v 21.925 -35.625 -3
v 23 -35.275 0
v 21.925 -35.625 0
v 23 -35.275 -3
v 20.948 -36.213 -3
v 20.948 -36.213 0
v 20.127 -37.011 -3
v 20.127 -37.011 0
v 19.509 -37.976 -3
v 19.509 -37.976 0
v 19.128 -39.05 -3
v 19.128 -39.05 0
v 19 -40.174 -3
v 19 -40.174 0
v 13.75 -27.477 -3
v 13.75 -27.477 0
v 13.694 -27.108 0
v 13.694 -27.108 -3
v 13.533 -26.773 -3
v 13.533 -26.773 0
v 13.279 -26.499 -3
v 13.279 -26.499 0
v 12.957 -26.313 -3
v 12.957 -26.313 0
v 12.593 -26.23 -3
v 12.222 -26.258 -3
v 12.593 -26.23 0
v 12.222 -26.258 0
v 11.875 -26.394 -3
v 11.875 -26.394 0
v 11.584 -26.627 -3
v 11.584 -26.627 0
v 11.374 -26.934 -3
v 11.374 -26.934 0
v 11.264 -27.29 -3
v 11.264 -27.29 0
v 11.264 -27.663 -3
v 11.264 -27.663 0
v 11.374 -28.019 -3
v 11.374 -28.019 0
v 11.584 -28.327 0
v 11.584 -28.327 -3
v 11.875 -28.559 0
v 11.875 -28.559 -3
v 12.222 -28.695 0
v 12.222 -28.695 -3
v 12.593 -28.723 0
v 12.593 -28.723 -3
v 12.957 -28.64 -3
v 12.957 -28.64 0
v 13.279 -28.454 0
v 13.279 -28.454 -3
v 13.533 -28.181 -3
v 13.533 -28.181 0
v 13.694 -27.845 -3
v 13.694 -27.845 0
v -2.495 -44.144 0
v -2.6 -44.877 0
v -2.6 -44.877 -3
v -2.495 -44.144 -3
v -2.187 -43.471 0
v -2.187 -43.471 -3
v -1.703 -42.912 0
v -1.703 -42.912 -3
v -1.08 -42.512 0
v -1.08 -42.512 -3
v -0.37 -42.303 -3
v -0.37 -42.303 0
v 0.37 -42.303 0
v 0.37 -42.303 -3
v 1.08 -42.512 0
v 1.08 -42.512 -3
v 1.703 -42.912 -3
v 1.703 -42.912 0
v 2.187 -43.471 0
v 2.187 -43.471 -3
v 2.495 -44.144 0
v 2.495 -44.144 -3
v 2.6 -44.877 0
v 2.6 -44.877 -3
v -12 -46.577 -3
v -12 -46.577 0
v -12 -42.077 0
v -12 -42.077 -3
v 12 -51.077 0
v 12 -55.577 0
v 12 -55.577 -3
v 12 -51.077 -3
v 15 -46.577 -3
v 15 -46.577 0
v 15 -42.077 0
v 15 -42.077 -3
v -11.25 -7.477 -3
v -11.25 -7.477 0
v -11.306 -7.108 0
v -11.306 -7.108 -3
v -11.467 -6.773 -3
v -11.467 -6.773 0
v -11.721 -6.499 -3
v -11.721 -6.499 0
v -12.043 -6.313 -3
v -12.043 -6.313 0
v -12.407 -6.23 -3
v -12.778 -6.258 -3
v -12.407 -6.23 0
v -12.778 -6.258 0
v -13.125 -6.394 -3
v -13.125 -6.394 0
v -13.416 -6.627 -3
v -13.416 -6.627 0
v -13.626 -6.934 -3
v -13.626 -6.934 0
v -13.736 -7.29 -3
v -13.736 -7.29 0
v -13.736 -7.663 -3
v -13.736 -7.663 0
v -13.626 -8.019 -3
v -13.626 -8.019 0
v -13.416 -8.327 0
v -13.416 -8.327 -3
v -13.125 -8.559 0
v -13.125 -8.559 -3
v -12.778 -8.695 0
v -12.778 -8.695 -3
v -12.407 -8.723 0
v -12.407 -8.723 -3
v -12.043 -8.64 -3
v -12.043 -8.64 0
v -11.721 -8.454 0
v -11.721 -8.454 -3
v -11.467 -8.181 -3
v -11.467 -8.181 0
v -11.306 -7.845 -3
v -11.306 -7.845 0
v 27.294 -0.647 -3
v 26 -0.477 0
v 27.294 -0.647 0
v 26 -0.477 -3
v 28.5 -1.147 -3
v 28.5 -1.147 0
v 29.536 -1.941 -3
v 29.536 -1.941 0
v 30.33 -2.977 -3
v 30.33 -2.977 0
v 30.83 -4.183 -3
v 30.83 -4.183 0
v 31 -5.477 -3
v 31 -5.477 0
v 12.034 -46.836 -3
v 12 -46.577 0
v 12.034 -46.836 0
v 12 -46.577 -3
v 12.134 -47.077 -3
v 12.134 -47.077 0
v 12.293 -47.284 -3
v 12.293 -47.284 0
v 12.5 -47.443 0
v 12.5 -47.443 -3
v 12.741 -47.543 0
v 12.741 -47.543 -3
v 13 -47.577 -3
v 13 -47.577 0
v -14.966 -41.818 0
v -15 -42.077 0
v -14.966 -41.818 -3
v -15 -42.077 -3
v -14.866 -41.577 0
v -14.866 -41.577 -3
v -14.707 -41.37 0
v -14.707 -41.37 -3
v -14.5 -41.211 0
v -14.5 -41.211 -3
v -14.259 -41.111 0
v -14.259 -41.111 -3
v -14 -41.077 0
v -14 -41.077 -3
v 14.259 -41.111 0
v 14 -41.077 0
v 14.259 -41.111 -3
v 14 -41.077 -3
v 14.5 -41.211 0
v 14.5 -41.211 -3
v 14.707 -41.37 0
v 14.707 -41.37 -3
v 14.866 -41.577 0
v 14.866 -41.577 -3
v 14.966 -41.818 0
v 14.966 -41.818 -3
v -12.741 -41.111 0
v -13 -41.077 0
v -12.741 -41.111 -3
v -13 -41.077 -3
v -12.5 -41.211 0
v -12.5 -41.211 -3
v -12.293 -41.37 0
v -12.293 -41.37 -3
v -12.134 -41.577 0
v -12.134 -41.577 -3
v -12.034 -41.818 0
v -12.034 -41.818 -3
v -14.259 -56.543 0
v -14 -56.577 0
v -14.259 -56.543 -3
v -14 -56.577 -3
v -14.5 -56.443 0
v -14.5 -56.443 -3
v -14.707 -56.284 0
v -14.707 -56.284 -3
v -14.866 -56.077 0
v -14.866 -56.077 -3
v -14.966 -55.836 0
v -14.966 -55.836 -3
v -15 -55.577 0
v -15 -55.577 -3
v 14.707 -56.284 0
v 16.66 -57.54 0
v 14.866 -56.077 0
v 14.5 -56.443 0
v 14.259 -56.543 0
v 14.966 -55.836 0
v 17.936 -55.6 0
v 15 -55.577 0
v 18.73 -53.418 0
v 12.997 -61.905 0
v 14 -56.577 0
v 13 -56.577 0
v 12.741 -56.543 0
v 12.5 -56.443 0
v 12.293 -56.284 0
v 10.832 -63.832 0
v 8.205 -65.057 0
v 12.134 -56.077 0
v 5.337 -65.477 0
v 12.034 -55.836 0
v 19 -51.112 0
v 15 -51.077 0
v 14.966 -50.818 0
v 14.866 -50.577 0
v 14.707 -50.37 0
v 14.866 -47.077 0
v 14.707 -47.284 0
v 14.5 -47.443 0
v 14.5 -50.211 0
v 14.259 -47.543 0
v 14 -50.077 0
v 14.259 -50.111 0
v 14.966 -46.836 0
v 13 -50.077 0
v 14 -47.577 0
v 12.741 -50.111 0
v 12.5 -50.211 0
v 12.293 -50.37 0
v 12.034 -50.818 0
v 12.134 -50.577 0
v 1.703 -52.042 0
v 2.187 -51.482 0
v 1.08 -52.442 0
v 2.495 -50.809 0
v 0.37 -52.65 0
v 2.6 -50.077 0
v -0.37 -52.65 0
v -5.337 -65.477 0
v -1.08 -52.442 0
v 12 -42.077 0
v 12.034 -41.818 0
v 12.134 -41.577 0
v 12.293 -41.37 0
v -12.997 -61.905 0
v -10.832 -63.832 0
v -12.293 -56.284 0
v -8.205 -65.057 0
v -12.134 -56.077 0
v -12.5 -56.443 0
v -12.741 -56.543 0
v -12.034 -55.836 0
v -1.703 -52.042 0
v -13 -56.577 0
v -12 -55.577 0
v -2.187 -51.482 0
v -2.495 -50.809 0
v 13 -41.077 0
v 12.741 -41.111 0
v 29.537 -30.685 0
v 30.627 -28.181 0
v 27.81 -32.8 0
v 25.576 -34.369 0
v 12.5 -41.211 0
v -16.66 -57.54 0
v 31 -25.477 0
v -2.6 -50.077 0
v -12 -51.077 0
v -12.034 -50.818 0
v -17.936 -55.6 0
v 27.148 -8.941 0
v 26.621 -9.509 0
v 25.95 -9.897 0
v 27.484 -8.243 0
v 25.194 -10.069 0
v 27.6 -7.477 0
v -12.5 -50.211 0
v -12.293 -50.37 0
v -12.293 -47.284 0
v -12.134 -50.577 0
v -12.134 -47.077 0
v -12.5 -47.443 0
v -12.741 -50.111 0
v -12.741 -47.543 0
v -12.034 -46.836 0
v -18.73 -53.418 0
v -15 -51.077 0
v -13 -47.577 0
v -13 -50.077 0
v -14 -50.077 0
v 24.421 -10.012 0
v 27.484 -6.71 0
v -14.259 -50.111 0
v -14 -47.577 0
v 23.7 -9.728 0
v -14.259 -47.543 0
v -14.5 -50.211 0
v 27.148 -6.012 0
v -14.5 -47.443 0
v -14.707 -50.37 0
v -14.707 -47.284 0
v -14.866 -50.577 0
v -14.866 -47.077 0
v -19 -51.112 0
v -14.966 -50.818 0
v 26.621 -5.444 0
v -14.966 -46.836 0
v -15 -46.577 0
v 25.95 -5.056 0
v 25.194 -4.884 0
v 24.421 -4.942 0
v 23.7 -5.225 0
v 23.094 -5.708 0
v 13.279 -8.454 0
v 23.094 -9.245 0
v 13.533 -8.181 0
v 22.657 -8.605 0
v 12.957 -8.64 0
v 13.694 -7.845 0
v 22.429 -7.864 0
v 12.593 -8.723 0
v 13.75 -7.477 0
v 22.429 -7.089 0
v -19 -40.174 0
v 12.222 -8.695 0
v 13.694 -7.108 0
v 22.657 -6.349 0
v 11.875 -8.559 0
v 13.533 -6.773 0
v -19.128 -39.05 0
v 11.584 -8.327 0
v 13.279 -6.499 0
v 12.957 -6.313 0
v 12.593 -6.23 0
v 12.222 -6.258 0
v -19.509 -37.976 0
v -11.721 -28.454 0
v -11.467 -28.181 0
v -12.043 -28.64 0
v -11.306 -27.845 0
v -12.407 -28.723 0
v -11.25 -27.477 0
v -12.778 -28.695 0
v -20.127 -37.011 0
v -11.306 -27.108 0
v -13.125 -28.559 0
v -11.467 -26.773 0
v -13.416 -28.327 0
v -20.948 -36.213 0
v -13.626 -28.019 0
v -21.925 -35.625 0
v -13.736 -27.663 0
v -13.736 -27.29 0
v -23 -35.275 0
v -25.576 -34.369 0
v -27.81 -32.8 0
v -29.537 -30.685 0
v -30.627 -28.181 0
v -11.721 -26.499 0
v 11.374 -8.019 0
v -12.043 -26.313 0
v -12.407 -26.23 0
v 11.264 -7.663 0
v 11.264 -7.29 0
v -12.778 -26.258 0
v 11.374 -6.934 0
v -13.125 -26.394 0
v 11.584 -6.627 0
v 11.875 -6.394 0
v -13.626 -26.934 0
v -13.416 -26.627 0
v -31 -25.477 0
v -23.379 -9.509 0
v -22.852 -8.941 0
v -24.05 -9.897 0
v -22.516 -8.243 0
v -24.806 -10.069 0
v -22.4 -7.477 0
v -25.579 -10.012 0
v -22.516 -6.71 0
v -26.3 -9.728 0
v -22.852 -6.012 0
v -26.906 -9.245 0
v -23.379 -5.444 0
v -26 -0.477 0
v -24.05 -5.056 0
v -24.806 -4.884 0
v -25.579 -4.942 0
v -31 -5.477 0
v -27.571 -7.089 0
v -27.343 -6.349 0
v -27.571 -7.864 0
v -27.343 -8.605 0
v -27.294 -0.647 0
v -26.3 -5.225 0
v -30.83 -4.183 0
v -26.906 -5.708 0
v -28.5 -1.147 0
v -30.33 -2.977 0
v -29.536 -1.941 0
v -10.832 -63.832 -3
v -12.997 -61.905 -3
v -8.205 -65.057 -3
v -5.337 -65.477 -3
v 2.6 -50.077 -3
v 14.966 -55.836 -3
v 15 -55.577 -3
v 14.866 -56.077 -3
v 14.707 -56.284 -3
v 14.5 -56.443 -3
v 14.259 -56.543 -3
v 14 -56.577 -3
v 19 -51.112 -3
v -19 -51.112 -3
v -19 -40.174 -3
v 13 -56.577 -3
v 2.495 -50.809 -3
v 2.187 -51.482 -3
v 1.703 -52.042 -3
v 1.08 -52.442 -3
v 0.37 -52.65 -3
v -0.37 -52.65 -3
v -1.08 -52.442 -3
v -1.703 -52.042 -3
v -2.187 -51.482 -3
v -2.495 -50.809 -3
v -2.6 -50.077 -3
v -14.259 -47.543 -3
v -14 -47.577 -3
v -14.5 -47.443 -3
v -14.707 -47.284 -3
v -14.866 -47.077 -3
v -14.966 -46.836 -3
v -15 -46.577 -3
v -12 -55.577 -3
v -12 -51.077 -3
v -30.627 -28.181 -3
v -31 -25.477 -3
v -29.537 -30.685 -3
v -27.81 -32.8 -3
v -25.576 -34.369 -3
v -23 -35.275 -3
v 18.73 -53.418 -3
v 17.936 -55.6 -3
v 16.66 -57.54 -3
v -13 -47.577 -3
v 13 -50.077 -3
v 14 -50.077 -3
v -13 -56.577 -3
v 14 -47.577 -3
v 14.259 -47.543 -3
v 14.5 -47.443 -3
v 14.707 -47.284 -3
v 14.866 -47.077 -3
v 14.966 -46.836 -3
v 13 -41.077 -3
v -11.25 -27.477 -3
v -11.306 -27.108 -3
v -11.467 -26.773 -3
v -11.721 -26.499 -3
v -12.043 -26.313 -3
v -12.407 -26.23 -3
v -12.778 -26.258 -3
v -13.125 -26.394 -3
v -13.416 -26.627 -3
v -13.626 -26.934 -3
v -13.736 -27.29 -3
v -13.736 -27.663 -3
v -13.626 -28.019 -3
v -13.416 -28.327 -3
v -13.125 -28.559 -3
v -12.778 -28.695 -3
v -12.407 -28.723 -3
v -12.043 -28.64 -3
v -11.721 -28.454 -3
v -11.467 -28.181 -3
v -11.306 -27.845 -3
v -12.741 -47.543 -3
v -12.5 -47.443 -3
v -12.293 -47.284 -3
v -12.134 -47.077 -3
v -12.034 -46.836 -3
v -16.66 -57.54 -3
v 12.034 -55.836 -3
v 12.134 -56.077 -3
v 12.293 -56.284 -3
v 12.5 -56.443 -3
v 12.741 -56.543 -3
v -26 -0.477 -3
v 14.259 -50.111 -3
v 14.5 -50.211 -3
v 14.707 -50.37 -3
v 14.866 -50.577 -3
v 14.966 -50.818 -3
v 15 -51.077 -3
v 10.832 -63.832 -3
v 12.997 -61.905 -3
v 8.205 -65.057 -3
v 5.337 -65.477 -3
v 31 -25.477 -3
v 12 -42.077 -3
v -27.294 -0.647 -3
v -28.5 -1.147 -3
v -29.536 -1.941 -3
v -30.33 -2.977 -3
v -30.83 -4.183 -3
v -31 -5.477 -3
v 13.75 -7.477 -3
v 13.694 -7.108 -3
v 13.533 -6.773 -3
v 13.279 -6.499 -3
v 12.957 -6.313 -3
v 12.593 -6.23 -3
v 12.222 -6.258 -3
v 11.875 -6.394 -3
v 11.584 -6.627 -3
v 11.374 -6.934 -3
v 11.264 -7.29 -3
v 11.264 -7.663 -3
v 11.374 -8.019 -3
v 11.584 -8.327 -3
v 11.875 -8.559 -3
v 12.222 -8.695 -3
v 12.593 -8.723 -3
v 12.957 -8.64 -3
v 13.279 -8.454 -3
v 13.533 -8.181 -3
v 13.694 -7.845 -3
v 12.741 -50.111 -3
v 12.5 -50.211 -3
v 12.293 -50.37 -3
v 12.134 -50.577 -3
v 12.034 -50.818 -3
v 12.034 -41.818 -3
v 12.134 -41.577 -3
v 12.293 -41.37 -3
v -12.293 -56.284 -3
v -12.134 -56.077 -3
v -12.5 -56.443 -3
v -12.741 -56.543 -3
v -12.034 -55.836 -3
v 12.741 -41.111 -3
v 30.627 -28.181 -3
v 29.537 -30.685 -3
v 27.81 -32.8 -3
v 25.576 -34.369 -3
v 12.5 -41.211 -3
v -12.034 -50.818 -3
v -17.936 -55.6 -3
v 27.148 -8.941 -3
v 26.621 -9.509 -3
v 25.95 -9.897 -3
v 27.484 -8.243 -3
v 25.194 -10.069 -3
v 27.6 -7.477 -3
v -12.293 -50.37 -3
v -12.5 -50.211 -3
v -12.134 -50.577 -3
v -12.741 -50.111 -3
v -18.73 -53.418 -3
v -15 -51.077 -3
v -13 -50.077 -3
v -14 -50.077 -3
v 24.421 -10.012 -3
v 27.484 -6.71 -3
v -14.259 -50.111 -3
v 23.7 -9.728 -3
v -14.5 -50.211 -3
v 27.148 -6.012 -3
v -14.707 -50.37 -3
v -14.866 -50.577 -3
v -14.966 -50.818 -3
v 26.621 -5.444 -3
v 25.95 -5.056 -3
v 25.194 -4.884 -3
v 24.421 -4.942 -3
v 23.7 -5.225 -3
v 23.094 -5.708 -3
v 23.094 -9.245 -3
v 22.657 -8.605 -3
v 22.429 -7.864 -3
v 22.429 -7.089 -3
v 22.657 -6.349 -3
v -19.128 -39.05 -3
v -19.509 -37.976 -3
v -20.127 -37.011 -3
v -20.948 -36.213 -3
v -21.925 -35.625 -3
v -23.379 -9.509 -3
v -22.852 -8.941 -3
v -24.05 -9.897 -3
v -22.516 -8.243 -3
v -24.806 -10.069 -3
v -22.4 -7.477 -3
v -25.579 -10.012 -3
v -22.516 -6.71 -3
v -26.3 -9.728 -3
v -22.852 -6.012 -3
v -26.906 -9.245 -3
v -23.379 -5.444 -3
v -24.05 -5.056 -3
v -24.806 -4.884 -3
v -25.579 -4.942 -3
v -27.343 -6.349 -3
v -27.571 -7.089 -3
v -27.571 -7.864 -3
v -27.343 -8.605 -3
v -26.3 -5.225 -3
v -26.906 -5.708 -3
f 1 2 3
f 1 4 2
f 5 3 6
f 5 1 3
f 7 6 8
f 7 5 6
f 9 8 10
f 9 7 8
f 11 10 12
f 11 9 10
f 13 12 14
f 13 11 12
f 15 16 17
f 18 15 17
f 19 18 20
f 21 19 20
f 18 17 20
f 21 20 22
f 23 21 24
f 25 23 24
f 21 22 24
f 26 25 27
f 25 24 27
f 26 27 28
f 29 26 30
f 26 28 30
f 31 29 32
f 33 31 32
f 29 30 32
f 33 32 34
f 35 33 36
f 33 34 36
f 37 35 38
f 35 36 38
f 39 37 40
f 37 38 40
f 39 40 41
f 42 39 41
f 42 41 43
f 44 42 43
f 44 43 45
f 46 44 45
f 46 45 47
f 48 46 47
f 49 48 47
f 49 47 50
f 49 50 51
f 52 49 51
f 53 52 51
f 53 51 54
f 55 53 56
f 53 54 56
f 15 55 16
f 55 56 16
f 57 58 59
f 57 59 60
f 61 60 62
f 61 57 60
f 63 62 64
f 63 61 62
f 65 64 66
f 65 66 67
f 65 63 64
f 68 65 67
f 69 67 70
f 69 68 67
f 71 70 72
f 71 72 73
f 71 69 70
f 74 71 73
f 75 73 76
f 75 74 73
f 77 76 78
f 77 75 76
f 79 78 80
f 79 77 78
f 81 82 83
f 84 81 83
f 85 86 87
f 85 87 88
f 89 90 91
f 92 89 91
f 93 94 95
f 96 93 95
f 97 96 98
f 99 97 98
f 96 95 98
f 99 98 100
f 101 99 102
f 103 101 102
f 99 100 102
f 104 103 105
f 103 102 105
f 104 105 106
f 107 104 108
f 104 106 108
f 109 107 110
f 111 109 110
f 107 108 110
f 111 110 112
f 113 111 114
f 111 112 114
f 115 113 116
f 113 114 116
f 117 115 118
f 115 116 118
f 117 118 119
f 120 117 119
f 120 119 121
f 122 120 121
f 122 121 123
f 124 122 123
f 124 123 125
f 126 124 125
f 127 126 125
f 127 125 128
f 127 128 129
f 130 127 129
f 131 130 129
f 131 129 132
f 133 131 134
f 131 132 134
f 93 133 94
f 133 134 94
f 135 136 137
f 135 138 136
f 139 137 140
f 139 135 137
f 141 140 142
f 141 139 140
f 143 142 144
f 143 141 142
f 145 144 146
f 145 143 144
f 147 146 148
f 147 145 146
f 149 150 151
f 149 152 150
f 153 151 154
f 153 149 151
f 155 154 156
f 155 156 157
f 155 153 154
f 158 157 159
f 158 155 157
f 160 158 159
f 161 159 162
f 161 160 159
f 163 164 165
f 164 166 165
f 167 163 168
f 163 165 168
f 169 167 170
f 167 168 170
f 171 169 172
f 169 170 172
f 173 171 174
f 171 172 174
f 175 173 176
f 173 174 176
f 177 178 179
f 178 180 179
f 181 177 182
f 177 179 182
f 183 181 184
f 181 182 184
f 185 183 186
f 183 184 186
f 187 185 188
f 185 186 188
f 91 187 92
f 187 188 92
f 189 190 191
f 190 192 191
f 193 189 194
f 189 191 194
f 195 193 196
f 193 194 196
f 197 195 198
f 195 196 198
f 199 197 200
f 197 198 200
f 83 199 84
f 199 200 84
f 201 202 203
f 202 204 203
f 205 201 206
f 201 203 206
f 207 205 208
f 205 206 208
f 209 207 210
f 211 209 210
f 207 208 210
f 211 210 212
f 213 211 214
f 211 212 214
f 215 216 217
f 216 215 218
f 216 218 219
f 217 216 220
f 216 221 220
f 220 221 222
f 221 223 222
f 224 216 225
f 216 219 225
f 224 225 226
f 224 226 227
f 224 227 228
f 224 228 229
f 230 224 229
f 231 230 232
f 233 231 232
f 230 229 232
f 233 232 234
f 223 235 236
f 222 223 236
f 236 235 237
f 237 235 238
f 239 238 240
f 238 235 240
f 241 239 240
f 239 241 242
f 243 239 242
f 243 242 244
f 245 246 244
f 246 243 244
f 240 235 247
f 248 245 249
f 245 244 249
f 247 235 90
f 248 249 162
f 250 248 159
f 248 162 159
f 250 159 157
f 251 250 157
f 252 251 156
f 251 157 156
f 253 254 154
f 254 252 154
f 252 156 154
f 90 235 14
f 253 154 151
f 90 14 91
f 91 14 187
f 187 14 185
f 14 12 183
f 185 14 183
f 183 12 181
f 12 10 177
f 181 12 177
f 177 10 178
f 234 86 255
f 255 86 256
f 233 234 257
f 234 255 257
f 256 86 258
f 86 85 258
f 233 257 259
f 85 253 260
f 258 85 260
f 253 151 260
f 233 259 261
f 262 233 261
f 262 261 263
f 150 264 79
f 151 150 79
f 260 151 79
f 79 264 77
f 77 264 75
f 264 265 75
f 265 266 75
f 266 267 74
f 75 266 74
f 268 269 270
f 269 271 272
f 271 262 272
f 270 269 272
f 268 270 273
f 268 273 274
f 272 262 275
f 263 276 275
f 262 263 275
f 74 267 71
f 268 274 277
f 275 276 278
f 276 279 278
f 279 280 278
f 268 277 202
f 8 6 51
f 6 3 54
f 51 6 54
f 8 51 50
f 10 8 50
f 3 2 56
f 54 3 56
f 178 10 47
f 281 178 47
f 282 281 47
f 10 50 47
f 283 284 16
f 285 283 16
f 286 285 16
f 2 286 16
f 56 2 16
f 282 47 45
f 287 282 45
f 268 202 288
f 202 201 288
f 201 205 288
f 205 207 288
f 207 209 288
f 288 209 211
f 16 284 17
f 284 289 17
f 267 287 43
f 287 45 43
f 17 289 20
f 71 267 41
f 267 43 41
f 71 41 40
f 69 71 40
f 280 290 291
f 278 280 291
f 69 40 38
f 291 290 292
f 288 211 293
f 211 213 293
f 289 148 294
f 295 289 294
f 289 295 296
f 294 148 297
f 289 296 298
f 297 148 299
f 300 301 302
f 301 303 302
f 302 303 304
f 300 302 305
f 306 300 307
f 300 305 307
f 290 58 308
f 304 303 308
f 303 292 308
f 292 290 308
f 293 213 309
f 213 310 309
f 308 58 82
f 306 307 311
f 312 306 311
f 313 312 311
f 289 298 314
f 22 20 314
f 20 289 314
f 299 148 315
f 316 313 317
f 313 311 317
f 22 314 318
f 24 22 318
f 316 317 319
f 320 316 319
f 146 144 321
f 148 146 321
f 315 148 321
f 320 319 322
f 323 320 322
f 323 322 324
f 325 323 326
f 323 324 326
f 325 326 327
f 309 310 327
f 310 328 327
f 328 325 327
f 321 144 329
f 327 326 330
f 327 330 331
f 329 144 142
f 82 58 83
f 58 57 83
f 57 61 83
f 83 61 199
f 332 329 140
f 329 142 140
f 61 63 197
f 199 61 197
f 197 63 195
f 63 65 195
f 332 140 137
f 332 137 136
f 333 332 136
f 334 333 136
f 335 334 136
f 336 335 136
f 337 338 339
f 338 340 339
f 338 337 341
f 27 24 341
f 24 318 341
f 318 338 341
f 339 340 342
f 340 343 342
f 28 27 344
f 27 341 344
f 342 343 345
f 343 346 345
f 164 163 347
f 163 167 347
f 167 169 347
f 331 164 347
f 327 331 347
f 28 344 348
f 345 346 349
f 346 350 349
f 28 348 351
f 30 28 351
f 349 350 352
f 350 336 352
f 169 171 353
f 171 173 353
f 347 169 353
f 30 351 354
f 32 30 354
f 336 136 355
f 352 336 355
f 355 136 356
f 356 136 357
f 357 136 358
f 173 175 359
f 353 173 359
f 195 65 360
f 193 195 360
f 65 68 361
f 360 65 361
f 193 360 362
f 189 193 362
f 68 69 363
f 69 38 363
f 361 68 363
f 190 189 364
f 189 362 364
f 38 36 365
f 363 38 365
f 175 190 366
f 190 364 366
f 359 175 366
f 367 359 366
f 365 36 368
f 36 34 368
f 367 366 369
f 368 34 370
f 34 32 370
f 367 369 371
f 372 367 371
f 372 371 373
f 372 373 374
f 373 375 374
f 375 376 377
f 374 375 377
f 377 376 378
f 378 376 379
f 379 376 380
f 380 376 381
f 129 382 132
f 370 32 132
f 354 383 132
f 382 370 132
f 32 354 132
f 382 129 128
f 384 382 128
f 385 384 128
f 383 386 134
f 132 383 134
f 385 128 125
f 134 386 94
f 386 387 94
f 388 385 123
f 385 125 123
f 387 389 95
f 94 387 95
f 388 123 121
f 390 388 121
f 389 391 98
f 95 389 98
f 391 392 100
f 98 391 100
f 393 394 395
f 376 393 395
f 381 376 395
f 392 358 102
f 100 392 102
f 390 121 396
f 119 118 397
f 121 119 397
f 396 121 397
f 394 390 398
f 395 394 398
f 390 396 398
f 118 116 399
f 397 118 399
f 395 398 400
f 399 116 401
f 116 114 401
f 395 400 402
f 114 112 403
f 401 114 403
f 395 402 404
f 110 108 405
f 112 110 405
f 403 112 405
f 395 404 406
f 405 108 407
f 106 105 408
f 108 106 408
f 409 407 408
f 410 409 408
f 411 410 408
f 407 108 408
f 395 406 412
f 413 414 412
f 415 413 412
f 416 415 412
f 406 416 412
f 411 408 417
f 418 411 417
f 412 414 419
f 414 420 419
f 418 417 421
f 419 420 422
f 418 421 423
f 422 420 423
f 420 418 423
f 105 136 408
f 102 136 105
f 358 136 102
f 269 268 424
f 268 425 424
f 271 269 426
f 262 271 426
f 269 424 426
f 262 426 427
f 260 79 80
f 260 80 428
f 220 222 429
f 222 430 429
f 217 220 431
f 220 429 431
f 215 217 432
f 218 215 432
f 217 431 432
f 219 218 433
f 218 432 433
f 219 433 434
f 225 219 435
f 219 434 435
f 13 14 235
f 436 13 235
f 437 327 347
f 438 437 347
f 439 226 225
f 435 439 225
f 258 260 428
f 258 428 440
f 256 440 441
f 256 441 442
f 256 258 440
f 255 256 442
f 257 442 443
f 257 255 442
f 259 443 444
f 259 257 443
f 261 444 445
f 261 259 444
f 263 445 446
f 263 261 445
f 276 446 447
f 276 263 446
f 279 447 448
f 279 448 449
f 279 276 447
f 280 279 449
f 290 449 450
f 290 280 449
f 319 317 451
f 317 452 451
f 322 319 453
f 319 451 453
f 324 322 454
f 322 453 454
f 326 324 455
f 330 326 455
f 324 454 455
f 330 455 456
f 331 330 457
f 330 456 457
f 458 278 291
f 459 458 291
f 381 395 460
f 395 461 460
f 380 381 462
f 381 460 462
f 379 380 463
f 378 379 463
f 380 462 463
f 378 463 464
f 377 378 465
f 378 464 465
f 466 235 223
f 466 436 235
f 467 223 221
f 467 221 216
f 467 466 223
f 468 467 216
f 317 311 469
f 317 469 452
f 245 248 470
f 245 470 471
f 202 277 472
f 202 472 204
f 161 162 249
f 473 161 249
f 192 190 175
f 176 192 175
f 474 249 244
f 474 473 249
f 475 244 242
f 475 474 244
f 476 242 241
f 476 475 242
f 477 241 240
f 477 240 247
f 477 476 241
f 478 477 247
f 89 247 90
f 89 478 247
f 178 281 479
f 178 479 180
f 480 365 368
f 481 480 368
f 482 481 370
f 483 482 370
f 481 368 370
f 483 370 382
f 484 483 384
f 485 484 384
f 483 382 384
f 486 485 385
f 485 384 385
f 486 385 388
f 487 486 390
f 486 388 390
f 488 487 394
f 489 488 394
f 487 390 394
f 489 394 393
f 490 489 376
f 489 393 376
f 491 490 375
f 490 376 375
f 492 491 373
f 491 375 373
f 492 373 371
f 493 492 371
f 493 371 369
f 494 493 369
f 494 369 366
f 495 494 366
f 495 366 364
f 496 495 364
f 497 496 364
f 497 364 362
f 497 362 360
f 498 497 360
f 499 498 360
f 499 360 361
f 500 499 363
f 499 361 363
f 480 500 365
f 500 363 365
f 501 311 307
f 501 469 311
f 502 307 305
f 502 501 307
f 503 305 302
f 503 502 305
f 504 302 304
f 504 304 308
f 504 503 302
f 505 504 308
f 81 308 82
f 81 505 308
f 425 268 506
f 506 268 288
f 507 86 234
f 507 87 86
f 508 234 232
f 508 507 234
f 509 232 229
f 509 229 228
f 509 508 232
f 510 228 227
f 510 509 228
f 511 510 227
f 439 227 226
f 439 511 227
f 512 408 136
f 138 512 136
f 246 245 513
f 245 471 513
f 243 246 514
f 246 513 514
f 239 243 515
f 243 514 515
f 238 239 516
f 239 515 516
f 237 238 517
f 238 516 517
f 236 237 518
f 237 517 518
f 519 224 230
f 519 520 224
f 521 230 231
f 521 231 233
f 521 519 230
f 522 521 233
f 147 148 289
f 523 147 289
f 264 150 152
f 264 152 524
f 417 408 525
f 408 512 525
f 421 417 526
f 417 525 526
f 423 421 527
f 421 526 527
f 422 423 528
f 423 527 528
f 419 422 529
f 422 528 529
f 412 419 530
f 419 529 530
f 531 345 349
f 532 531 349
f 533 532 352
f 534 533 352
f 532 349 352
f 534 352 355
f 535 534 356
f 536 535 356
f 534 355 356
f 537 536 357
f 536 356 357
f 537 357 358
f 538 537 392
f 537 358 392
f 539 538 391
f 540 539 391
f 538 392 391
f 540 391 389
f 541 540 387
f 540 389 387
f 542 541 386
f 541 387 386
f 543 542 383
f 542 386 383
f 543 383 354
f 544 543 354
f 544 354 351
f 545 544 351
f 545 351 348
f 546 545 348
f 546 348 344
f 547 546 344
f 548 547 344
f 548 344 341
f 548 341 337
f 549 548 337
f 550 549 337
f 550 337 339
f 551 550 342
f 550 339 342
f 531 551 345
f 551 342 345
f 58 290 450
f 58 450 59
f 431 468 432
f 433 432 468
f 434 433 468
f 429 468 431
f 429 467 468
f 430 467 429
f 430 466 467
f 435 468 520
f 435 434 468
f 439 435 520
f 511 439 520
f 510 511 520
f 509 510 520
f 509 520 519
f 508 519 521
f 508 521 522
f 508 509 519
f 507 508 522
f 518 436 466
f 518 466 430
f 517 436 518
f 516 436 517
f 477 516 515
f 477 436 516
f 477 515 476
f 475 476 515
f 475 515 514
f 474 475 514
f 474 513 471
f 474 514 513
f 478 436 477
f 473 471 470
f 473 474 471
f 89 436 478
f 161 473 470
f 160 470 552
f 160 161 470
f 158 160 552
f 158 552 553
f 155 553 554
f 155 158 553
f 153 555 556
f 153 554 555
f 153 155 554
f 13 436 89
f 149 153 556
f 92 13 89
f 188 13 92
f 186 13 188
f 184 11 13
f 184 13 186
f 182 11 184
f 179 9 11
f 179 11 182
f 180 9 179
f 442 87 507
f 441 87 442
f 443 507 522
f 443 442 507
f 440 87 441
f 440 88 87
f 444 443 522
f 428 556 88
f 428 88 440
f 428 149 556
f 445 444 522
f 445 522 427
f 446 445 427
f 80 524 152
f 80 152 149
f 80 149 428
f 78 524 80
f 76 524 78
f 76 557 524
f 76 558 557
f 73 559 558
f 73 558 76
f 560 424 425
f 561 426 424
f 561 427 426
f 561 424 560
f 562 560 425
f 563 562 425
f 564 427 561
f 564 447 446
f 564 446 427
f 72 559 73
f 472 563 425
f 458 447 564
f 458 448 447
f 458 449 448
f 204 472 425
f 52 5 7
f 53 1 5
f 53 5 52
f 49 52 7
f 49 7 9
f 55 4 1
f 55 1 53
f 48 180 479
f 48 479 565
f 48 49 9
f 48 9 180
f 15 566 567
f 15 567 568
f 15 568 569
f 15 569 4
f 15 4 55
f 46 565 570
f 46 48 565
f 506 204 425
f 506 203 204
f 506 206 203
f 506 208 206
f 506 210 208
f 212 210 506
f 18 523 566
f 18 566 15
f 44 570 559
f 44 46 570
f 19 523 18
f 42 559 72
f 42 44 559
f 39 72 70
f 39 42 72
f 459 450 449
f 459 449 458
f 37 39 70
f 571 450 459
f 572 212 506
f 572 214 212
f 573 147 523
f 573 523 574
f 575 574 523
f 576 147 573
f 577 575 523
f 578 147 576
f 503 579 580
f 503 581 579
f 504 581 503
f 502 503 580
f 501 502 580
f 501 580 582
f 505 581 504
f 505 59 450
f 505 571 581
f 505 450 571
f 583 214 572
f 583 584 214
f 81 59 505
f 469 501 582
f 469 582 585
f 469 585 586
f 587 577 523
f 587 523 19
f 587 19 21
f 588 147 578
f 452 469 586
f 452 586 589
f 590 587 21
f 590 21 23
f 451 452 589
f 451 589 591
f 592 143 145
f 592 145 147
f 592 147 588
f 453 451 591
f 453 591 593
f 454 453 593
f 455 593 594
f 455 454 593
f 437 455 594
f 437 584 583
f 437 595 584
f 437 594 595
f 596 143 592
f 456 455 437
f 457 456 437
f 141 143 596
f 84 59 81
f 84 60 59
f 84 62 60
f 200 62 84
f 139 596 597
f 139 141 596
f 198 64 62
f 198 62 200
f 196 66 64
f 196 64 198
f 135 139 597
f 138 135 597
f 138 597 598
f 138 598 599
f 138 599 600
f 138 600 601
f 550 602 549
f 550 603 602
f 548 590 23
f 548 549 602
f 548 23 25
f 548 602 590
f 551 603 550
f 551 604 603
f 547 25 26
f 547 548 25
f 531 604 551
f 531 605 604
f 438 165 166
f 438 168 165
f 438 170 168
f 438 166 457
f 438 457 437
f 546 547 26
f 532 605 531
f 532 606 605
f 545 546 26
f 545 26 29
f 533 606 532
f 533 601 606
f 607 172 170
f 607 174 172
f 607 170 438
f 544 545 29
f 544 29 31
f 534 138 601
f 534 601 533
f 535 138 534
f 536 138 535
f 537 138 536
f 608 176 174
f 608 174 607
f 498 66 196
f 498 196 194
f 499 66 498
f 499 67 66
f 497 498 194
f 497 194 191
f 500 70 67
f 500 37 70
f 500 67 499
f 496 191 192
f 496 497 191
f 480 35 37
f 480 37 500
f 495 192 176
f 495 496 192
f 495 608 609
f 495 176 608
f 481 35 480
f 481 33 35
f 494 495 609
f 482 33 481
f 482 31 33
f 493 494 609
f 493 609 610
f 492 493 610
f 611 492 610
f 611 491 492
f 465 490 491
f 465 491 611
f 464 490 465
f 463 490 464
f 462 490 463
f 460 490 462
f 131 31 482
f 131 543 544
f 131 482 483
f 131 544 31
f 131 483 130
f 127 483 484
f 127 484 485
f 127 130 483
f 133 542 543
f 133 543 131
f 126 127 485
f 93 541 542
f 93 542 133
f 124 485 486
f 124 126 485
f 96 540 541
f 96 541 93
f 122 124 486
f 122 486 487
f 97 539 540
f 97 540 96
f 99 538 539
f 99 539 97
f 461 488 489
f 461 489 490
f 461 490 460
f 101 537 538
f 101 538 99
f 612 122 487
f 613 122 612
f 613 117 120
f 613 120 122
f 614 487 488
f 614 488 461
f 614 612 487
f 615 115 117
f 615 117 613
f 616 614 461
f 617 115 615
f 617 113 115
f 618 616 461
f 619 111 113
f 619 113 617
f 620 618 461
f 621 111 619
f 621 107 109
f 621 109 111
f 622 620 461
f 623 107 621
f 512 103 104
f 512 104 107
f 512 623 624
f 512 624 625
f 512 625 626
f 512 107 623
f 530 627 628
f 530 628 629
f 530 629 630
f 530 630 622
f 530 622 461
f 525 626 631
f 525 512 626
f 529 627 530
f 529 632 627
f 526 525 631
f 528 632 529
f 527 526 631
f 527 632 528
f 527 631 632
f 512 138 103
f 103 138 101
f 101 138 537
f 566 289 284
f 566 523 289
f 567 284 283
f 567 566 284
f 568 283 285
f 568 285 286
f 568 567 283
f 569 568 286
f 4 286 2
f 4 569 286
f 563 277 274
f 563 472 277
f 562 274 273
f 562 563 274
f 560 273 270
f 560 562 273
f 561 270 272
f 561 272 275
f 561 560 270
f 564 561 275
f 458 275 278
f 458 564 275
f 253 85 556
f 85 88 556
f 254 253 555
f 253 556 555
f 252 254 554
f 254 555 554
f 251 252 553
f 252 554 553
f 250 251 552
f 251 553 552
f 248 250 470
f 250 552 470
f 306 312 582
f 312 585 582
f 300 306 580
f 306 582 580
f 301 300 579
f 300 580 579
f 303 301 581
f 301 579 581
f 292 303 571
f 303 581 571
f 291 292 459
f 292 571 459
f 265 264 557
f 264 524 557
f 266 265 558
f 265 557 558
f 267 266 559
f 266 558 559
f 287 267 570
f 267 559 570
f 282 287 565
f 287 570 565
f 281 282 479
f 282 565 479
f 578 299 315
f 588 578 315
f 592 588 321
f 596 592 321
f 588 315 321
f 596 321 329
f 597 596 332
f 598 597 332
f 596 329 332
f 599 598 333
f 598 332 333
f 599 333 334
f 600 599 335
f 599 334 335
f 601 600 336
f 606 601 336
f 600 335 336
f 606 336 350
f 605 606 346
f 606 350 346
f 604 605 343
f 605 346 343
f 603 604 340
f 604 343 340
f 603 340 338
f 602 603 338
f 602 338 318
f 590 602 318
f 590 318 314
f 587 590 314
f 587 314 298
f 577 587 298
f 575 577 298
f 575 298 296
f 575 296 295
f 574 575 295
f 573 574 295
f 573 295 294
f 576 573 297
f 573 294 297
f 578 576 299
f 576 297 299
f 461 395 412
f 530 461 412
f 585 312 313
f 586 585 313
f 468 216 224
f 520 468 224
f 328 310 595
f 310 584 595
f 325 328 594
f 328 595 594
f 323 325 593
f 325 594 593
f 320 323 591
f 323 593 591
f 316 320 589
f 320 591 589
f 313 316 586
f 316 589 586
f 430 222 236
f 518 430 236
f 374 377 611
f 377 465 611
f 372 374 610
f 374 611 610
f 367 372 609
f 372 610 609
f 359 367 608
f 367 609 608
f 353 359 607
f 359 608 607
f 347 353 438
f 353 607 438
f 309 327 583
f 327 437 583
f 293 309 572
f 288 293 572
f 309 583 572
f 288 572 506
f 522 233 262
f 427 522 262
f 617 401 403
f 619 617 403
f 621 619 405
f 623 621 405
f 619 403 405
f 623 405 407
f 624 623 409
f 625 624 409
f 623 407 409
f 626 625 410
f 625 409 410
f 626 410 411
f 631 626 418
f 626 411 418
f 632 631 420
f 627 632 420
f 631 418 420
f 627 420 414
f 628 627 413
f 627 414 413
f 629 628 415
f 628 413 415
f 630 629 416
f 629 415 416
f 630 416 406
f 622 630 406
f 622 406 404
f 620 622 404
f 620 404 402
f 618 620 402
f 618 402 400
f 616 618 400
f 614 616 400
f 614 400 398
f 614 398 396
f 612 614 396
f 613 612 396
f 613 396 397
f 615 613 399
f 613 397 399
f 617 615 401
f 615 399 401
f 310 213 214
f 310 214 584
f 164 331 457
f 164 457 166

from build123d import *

# Parameters (mm, degrees)
SKETCH1_R            = 2.6
SKETCH1_R_2          = 1.25
BASE_FLANGE1_DEPTH   = 3
FILLET1_R            = 5
FILLET2_R            = 10
CUT_EXTRUDE1_REACH   = 74.507
SKETCH3_W            = 3
SKETCH3_H            = 6.5
FILLET3_R            = 1
FILLET3_OF_MIRROR1_R = 1
FILLET4_R            = 5


# Sheet-metal steps are written as plain solids
with BuildPart() as part:
    # Sketch1 → Base-Flange1 (new body)
    with BuildSketch(Plane.XY):
        Polygon((-31, -0.476720525), (31, -0.476720525), (31, -35.476720525), (19, -35.476720525), (19, -54.752062511), (10, -65.476720525), (-10, -65.476720525), (-19, -54.752062511), (-19, -35.476720525), (-31, -35.476720525), align=None)
        with Locations((25, -7.476720525)):
            Circle(SKETCH1_R, mode=Mode.SUBTRACT)
        with Locations((-25, -7.476720525)):
            Circle(SKETCH1_R, mode=Mode.SUBTRACT)
        with Locations((-12.5, -27.476720525)):
            Circle(SKETCH1_R_2, mode=Mode.SUBTRACT)
        with Locations((12.5, -27.476720525)):
            Circle(SKETCH1_R_2, mode=Mode.SUBTRACT)
        with Locations((12.5, -7.476720525)):
            Circle(SKETCH1_R_2, mode=Mode.SUBTRACT)
        with Locations((-12.5, -7.476720525)):
            Circle(SKETCH1_R_2, mode=Mode.SUBTRACT)
        with BuildLine():
            Line((-2.6, -50.076720525), (-2.6, -44.876720525))
            ThreePointArc((-2.6, -44.876720525), (0, -42.276720525), (2.6, -44.876720525))
            Line((2.6, -44.876720525), (2.6, -50.076720525))
            ThreePointArc((2.6, -50.076720525), (0, -52.676720525), (-2.6, -50.076720525))
        make_face(mode=Mode.SUBTRACT)
    extrude(amount=-BASE_FLANGE1_DEPTH)

    # Fillet1
    fillet1_edges = [part.edges().sort_by_distance(p)[0] for p in [
        (-31, -0.476720525, -1.5),
        (31, -0.476720525, -1.5),
    ]]
    fillet(fillet1_edges, radius=FILLET1_R)

    # Fillet2
    fillet2_edges = [part.edges().sort_by_distance(p)[0] for p in [
        (31, -35.476720525, -1.5),
        (19, -54.752062511, -1.5),
        (10, -65.476720525, -1.5),
        (-10, -65.476720525, -1.5),
        (-19, -54.752062511, -1.5),
        (-31, -35.476720525, -1.5),
    ]]
    fillet(fillet2_edges, radius=FILLET2_R)

    # Sketch3 → Cut-Extrude1 (cut, up to next)
    with BuildSketch(Plane.XY, mode=Mode.PRIVATE) as cut_extrude1_sk1:
        with Locations((13.5, -44.326720525)):
            Rectangle(SKETCH3_W, SKETCH3_H)
    cut_extrude1_tool1 = extrude(cut_extrude1_sk1.sketch, amount=-CUT_EXTRUDE1_REACH, mode=Mode.PRIVATE) & part.part
    # Sketch3 → Cut-Extrude1 (cut, up to next)
    with BuildSketch(Plane.XY, mode=Mode.PRIVATE) as cut_extrude1_sk2:
        with Locations((13.5, -53.326720525)):
            Rectangle(SKETCH3_W, SKETCH3_H)
    cut_extrude1_tool2 = extrude(cut_extrude1_sk2.sketch, amount=-CUT_EXTRUDE1_REACH, mode=Mode.PRIVATE) & part.part
    cut_extrude1_1 = cut_extrude1_tool1.solids().sort_by_distance((13.5, -44.326721, 0))[0]
    add(cut_extrude1_1, mode=Mode.SUBTRACT)
    cut_extrude1_2 = cut_extrude1_tool2.solids().sort_by_distance((13.5, -53.326721, 0))[0]
    add(cut_extrude1_2, mode=Mode.SUBTRACT)
    cut_extrude1 = cut_extrude1_1 + cut_extrude1_2  # Cut-Extrude1 as one shape, for the pattern or mirror that repeats it

    # Fillet3
    fillet3_edges = [part.edges().sort_by_distance(p)[0] for p in [
        (12, -47.576720525, -1.5),
        (12, -41.076720525, -1.5),
        (15, -41.076720525, -1.5),
        (15, -47.576720525, -1.5),
        (12, -56.576720525, -1.5),
        (12, -50.076720525, -1.5),
        (15, -50.076720525, -1.5),
        (15, -56.576720525, -1.5),
    ]]
    fillet(fillet3_edges, radius=FILLET3_R)

    # Mirror1: Cut-Extrude1 across plane
    add(cut_extrude1.mirror(Plane(origin=(0, 0, 0), x_dir=(0, 0, 1), z_dir=(1, 0, 0))), mode=Mode.SUBTRACT)

    # Fillet3 of Mirror1
    fillet3_of_mirror1_edges = [part.edges().sort_by_distance(p)[0] for p in [
        (-12, -47.576720525, -1.5),
        (-12, -41.076720525, -1.5),
        (-15, -41.076720525, -1.5),
        (-15, -47.576720525, -1.5),
        (-12, -56.576720525, -1.5),
        (-12, -50.076720525, -1.5),
        (-15, -50.076720525, -1.5),
        (-15, -56.576720525, -1.5),
    ]]
    fillet(fillet3_of_mirror1_edges, radius=FILLET3_OF_MIRROR1_R)

    # Fillet4
    fillet4_edges = [part.edges().sort_by_distance(p)[0] for p in [
        (19, -35.476720525, -1.5),
        (-19, -35.476720525, -1.5),
    ]]
    fillet(fillet4_edges, radius=FILLET4_R)


solid = part.part
